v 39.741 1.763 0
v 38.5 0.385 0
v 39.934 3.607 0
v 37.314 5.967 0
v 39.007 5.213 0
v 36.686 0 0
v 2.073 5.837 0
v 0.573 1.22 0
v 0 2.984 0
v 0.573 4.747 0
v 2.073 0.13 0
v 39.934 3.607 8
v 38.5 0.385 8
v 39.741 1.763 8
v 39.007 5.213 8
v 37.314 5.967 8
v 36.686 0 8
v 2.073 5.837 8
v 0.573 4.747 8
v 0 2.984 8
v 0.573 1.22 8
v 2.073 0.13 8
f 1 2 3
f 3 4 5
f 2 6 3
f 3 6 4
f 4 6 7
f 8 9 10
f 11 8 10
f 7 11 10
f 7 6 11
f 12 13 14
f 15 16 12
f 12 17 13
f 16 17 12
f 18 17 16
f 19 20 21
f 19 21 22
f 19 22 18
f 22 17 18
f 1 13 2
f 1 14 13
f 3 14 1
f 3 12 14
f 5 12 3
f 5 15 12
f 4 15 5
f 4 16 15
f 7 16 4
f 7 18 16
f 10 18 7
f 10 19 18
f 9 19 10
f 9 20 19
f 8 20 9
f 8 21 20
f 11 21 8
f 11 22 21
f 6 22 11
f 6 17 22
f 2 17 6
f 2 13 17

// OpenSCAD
$fn = 32;

// ----------------------------------------------------------------------
// Key bar: parallel key, 8 mm thick
// ----------------------------------------------------------------------

// --- parameters (mm) ---
profile_height = 8;       // extrusion height
profile_points = 11;      // points of the closed outline

profile = [[0, 2.984], [0.573, 1.22], [2.073, 0.13], [36.686, 0], [38.5, 0.385], [39.741, 1.763], [39.934, 3.607], [39.007, 5.213], [37.314, 5.967], [2.073, 5.837], [0.573, 4.747]];  // single closed polygon, 11 points, counter clockwise

// --- the one profile operation ---
linear_extrude(height = profile_height) polygon(points = profile);
